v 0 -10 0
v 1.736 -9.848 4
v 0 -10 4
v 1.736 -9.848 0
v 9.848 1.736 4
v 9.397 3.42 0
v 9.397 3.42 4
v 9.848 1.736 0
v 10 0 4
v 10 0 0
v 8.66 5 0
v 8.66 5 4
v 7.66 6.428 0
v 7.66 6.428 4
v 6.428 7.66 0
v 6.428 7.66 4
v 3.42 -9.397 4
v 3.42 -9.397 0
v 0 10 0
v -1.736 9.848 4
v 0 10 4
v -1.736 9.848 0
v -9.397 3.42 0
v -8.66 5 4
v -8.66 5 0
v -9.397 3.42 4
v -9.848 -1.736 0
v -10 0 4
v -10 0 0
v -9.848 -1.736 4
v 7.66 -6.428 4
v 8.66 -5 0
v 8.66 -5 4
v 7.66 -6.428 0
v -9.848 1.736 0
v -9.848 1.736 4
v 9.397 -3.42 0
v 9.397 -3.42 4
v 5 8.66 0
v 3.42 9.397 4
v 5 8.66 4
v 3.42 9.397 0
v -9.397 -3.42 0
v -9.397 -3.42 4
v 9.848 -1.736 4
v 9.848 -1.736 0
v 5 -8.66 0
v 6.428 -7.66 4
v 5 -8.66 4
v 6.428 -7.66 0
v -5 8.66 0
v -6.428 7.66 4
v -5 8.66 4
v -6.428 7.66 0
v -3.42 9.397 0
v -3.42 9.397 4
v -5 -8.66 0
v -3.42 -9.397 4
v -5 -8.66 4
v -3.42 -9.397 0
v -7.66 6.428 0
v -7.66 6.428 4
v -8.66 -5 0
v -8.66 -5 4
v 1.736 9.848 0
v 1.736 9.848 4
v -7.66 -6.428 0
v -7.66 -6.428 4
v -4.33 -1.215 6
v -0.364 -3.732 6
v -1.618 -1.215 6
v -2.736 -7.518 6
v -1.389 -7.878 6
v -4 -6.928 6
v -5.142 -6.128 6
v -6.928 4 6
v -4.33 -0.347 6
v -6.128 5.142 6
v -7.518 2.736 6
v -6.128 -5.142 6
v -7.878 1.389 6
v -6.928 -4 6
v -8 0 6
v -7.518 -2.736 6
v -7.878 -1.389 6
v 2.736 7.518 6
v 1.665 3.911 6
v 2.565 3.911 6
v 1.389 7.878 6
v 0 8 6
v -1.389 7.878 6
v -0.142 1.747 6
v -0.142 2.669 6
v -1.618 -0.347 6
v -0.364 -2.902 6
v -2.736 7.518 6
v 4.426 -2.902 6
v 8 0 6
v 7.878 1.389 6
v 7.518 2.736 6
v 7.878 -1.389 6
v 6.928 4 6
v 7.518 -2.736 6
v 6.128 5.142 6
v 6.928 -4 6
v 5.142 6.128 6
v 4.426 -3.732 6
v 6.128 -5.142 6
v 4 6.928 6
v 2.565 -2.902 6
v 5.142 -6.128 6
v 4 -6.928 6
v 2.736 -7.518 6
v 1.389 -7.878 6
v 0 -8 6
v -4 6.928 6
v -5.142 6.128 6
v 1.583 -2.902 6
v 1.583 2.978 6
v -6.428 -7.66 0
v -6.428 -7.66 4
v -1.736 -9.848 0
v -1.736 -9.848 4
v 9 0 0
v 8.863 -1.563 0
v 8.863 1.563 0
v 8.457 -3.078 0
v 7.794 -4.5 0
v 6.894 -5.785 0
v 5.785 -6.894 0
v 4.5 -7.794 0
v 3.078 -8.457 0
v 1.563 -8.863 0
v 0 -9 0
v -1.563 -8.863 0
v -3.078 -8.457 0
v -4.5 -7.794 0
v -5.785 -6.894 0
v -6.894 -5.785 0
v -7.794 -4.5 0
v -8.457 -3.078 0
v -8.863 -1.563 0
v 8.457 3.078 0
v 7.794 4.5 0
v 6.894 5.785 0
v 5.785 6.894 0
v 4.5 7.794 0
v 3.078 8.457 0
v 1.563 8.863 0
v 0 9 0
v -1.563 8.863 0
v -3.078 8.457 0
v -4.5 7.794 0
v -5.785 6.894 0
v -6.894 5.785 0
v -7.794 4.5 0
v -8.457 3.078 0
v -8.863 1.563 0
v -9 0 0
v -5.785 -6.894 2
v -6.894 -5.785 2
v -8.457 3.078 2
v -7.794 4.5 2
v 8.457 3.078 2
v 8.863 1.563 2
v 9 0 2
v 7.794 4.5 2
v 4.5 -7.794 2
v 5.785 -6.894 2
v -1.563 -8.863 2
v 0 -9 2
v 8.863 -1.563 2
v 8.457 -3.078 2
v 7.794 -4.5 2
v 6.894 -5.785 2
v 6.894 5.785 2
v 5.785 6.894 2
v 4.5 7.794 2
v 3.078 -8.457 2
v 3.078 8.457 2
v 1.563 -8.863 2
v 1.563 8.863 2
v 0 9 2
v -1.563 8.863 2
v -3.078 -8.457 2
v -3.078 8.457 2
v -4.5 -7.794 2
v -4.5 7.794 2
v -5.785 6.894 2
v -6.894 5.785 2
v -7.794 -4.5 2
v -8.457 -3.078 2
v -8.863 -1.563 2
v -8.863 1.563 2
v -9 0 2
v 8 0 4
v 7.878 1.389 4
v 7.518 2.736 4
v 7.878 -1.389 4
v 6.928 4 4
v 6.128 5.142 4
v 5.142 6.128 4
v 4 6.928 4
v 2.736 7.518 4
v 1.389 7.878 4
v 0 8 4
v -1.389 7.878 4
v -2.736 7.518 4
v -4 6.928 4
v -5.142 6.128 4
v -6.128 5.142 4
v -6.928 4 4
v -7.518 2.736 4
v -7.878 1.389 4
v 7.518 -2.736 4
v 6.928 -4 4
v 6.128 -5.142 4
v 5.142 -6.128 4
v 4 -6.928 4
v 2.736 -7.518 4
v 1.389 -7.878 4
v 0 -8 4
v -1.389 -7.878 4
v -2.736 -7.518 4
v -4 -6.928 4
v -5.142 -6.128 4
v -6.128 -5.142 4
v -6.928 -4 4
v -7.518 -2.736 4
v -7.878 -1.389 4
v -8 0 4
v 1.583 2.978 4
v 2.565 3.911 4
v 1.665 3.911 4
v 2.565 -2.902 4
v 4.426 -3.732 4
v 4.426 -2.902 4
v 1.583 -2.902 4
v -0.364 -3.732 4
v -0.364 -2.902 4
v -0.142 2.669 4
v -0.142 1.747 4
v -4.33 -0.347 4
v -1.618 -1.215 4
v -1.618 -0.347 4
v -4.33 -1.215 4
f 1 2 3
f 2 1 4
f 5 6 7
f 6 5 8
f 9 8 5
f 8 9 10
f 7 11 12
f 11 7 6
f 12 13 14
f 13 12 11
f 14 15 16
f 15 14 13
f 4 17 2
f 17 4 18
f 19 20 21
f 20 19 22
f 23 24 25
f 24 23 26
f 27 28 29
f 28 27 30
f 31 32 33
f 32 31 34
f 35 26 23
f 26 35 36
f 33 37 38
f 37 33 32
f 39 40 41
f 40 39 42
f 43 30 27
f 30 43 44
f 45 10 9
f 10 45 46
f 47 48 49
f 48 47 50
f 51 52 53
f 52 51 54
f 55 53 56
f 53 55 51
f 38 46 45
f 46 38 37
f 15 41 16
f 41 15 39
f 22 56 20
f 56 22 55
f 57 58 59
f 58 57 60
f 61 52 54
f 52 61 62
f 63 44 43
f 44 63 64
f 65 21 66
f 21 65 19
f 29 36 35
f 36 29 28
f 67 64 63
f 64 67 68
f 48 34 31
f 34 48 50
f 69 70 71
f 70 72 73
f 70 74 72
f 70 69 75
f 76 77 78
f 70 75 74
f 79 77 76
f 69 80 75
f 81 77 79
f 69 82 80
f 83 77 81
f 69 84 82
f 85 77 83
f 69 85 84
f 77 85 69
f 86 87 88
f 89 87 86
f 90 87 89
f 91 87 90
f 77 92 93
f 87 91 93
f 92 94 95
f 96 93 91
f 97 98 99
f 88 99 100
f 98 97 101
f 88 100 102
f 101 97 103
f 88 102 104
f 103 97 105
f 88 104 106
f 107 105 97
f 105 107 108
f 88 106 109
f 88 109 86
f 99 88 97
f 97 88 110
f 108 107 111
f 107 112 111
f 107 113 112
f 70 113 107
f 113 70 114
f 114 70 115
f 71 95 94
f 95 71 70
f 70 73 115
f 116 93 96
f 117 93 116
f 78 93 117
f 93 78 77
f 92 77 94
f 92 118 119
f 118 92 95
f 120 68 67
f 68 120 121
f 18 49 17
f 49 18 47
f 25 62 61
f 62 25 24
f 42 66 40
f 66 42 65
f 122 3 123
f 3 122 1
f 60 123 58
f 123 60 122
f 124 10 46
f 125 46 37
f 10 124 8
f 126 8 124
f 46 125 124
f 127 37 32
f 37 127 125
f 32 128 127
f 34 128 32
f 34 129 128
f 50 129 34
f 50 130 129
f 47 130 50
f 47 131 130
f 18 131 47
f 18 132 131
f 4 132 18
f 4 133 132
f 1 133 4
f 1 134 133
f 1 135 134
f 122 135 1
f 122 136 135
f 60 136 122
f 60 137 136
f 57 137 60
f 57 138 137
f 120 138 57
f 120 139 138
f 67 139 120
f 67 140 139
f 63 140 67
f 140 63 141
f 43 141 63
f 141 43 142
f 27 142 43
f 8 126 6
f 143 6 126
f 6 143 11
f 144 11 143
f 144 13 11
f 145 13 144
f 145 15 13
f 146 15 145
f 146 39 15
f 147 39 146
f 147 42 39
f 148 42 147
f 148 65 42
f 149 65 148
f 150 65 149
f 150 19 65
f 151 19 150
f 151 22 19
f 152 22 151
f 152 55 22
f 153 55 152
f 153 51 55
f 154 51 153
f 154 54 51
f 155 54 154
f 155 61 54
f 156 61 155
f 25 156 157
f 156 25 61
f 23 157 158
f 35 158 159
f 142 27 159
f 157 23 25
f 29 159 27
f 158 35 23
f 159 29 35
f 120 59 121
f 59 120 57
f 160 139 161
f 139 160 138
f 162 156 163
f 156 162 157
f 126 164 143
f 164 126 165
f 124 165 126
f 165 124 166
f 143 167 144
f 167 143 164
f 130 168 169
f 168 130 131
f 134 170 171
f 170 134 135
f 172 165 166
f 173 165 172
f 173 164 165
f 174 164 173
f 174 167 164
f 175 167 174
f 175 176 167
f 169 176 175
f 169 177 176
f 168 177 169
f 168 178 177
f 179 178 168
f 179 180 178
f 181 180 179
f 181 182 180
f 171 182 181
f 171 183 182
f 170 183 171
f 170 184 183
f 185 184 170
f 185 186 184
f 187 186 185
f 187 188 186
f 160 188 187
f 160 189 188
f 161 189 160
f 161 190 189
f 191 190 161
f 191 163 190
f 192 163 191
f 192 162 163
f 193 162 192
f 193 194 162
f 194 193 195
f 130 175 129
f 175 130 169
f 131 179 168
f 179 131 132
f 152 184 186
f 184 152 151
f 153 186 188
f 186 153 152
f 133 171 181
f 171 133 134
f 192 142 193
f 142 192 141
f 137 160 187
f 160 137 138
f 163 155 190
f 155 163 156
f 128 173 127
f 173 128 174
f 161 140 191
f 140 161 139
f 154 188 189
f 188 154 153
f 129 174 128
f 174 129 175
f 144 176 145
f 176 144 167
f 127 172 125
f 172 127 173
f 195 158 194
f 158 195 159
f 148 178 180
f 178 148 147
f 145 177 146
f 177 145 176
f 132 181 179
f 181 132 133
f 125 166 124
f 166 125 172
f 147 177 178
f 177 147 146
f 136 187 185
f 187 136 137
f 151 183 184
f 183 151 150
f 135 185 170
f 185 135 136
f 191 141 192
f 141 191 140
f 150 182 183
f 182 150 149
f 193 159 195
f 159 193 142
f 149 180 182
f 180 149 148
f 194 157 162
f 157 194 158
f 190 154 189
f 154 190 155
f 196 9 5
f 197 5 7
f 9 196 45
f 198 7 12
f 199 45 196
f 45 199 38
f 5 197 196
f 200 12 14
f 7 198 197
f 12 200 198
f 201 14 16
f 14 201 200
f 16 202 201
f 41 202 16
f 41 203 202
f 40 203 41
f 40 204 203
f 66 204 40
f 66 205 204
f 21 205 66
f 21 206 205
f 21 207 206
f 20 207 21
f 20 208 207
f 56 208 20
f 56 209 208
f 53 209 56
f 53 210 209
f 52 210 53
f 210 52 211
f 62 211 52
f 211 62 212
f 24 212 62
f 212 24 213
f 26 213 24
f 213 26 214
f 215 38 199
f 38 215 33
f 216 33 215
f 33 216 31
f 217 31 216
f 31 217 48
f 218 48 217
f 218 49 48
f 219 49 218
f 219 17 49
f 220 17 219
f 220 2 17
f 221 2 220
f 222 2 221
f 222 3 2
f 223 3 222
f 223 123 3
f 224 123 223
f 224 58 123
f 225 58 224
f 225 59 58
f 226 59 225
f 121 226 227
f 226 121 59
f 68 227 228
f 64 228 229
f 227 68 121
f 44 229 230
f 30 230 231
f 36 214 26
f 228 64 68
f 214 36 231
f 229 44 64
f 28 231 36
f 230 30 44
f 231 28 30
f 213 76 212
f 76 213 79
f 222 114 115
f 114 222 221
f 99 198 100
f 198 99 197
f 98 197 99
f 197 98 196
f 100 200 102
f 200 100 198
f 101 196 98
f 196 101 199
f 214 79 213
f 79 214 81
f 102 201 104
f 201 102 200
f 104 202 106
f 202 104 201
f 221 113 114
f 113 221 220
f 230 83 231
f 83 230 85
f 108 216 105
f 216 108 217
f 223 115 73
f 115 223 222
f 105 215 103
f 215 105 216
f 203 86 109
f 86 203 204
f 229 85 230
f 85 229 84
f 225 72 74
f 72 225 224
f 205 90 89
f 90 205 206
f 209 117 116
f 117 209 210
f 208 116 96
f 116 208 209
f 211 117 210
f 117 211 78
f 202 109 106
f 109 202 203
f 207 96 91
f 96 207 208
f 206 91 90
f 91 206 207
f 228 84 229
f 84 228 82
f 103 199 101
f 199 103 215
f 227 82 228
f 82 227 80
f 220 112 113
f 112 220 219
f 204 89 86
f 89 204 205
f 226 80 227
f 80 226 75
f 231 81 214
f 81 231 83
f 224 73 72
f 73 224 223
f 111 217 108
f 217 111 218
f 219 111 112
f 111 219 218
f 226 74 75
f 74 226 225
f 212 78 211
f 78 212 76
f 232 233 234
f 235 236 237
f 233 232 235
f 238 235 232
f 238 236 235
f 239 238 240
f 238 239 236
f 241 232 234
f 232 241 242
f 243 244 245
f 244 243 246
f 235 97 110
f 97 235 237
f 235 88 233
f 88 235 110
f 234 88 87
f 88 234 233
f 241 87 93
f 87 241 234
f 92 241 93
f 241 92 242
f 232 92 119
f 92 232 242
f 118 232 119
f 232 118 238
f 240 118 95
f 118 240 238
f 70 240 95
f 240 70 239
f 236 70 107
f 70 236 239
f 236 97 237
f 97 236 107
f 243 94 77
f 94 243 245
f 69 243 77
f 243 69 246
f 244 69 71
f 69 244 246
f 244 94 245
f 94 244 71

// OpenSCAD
difference() {
	difference() {
		difference() {
			cylinder($fn = 36, h = 6, r = 10);
			translate(v = [0, 0, -1]) {
				cylinder($fn = 36, h = 3, r = 9);
			}
		}
		translate(v = [0, 0, 4]) {
			difference() {
				cylinder($fn = 36, h = 3, r = 10.5000000000);
				cylinder($fn = 36, h = 3, r = 8);
			}
		}
	}
	translate(v = [0, 0, 4]) {
		linear_extrude(height = 3) {
			text(halign = "center", size = 8, text = "-1", valign = "center");
		}
	}
}
